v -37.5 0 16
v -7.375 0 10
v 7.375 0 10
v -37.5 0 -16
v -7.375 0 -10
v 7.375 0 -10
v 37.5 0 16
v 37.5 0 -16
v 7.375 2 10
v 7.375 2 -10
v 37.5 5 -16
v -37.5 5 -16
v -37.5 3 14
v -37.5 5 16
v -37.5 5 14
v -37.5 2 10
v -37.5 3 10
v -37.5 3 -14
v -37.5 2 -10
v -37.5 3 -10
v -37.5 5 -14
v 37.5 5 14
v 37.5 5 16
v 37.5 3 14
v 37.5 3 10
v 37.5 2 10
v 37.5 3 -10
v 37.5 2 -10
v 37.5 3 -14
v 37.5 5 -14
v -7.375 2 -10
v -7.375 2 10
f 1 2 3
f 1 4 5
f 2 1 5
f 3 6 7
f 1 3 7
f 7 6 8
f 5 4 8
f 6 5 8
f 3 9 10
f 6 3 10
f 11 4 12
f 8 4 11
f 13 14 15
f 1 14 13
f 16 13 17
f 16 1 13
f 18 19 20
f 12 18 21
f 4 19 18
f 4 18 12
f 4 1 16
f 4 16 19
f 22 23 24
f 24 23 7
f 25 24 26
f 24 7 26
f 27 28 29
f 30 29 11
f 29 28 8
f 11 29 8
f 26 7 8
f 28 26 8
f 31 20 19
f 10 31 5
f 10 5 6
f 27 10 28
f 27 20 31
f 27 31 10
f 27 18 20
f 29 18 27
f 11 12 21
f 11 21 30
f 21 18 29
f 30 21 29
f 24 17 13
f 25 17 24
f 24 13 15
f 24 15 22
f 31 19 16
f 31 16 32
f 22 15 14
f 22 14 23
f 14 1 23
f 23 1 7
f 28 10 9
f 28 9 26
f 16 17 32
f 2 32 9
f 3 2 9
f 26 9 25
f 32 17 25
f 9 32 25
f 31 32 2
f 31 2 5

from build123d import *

# Parameters (mm, degrees)
SKETCH1_W           = 75
SKETCH1_H           = 32
BOSS_EXTRUDE1_DEPTH = 3
SKETCH2_W           = 75
SKETCH2_H           = 2
BOSS_EXTRUDE2_DEPTH = 2
SKETCH3_W           = 75
SKETCH3_H           = 2
BOSS_EXTRUDE3_DEPTH = 2
SKETCH6_W           = 14.75
SKETCH6_H           = 20
CUT_EXTRUDE3_DEPTH  = 41.880924647
SKETCH7_W           = 75
SKETCH7_H           = 20
CUT_EXTRUDE4_DEPTH  = 1


with BuildPart() as part:
    # Sketch1 → Boss-Extrude1 (new body)
    with BuildSketch(Plane(origin=(0, 0, 0), x_dir=(1, 0, 0), z_dir=(0, 1, 0))):
        Rectangle(SKETCH1_W, SKETCH1_H)
    extrude(amount=BOSS_EXTRUDE1_DEPTH)

    # Sketch2 → Boss-Extrude2 (add)
    with BuildSketch(Plane(origin=(0, 3, 0), x_dir=(1, 0, 0), z_dir=(0, 1, 0))):
        with Locations((0, 15)):
            Rectangle(SKETCH2_W, SKETCH2_H)
    extrude(amount=BOSS_EXTRUDE2_DEPTH)

    # Sketch3 → Boss-Extrude3 (add)
    with BuildSketch(Plane(origin=(0, 3, 0), x_dir=(1, 0, 0), z_dir=(0, 1, 0))):
        with Locations((0, -15)):
            Rectangle(SKETCH3_W, SKETCH3_H)
    extrude(amount=BOSS_EXTRUDE3_DEPTH)

    # Sketch6 → Cut-Extrude3 (cut, through all)
    with BuildSketch(Plane(origin=(0, 3, 0), x_dir=(1, 0, 0), z_dir=(0, 1, 0))):
        Rectangle(SKETCH6_W, SKETCH6_H)
    extrude(amount=-CUT_EXTRUDE3_DEPTH, mode=Mode.SUBTRACT)

    # Sketch7 → Cut-Extrude4 (cut)
    with BuildSketch(Plane(origin=(0, 3, 0), x_dir=(1, 0, 0), z_dir=(0, 1, 0))):
        Rectangle(SKETCH7_W, SKETCH7_H)
    extrude(amount=-CUT_EXTRUDE4_DEPTH, mode=Mode.SUBTRACT)


solid = part.part
